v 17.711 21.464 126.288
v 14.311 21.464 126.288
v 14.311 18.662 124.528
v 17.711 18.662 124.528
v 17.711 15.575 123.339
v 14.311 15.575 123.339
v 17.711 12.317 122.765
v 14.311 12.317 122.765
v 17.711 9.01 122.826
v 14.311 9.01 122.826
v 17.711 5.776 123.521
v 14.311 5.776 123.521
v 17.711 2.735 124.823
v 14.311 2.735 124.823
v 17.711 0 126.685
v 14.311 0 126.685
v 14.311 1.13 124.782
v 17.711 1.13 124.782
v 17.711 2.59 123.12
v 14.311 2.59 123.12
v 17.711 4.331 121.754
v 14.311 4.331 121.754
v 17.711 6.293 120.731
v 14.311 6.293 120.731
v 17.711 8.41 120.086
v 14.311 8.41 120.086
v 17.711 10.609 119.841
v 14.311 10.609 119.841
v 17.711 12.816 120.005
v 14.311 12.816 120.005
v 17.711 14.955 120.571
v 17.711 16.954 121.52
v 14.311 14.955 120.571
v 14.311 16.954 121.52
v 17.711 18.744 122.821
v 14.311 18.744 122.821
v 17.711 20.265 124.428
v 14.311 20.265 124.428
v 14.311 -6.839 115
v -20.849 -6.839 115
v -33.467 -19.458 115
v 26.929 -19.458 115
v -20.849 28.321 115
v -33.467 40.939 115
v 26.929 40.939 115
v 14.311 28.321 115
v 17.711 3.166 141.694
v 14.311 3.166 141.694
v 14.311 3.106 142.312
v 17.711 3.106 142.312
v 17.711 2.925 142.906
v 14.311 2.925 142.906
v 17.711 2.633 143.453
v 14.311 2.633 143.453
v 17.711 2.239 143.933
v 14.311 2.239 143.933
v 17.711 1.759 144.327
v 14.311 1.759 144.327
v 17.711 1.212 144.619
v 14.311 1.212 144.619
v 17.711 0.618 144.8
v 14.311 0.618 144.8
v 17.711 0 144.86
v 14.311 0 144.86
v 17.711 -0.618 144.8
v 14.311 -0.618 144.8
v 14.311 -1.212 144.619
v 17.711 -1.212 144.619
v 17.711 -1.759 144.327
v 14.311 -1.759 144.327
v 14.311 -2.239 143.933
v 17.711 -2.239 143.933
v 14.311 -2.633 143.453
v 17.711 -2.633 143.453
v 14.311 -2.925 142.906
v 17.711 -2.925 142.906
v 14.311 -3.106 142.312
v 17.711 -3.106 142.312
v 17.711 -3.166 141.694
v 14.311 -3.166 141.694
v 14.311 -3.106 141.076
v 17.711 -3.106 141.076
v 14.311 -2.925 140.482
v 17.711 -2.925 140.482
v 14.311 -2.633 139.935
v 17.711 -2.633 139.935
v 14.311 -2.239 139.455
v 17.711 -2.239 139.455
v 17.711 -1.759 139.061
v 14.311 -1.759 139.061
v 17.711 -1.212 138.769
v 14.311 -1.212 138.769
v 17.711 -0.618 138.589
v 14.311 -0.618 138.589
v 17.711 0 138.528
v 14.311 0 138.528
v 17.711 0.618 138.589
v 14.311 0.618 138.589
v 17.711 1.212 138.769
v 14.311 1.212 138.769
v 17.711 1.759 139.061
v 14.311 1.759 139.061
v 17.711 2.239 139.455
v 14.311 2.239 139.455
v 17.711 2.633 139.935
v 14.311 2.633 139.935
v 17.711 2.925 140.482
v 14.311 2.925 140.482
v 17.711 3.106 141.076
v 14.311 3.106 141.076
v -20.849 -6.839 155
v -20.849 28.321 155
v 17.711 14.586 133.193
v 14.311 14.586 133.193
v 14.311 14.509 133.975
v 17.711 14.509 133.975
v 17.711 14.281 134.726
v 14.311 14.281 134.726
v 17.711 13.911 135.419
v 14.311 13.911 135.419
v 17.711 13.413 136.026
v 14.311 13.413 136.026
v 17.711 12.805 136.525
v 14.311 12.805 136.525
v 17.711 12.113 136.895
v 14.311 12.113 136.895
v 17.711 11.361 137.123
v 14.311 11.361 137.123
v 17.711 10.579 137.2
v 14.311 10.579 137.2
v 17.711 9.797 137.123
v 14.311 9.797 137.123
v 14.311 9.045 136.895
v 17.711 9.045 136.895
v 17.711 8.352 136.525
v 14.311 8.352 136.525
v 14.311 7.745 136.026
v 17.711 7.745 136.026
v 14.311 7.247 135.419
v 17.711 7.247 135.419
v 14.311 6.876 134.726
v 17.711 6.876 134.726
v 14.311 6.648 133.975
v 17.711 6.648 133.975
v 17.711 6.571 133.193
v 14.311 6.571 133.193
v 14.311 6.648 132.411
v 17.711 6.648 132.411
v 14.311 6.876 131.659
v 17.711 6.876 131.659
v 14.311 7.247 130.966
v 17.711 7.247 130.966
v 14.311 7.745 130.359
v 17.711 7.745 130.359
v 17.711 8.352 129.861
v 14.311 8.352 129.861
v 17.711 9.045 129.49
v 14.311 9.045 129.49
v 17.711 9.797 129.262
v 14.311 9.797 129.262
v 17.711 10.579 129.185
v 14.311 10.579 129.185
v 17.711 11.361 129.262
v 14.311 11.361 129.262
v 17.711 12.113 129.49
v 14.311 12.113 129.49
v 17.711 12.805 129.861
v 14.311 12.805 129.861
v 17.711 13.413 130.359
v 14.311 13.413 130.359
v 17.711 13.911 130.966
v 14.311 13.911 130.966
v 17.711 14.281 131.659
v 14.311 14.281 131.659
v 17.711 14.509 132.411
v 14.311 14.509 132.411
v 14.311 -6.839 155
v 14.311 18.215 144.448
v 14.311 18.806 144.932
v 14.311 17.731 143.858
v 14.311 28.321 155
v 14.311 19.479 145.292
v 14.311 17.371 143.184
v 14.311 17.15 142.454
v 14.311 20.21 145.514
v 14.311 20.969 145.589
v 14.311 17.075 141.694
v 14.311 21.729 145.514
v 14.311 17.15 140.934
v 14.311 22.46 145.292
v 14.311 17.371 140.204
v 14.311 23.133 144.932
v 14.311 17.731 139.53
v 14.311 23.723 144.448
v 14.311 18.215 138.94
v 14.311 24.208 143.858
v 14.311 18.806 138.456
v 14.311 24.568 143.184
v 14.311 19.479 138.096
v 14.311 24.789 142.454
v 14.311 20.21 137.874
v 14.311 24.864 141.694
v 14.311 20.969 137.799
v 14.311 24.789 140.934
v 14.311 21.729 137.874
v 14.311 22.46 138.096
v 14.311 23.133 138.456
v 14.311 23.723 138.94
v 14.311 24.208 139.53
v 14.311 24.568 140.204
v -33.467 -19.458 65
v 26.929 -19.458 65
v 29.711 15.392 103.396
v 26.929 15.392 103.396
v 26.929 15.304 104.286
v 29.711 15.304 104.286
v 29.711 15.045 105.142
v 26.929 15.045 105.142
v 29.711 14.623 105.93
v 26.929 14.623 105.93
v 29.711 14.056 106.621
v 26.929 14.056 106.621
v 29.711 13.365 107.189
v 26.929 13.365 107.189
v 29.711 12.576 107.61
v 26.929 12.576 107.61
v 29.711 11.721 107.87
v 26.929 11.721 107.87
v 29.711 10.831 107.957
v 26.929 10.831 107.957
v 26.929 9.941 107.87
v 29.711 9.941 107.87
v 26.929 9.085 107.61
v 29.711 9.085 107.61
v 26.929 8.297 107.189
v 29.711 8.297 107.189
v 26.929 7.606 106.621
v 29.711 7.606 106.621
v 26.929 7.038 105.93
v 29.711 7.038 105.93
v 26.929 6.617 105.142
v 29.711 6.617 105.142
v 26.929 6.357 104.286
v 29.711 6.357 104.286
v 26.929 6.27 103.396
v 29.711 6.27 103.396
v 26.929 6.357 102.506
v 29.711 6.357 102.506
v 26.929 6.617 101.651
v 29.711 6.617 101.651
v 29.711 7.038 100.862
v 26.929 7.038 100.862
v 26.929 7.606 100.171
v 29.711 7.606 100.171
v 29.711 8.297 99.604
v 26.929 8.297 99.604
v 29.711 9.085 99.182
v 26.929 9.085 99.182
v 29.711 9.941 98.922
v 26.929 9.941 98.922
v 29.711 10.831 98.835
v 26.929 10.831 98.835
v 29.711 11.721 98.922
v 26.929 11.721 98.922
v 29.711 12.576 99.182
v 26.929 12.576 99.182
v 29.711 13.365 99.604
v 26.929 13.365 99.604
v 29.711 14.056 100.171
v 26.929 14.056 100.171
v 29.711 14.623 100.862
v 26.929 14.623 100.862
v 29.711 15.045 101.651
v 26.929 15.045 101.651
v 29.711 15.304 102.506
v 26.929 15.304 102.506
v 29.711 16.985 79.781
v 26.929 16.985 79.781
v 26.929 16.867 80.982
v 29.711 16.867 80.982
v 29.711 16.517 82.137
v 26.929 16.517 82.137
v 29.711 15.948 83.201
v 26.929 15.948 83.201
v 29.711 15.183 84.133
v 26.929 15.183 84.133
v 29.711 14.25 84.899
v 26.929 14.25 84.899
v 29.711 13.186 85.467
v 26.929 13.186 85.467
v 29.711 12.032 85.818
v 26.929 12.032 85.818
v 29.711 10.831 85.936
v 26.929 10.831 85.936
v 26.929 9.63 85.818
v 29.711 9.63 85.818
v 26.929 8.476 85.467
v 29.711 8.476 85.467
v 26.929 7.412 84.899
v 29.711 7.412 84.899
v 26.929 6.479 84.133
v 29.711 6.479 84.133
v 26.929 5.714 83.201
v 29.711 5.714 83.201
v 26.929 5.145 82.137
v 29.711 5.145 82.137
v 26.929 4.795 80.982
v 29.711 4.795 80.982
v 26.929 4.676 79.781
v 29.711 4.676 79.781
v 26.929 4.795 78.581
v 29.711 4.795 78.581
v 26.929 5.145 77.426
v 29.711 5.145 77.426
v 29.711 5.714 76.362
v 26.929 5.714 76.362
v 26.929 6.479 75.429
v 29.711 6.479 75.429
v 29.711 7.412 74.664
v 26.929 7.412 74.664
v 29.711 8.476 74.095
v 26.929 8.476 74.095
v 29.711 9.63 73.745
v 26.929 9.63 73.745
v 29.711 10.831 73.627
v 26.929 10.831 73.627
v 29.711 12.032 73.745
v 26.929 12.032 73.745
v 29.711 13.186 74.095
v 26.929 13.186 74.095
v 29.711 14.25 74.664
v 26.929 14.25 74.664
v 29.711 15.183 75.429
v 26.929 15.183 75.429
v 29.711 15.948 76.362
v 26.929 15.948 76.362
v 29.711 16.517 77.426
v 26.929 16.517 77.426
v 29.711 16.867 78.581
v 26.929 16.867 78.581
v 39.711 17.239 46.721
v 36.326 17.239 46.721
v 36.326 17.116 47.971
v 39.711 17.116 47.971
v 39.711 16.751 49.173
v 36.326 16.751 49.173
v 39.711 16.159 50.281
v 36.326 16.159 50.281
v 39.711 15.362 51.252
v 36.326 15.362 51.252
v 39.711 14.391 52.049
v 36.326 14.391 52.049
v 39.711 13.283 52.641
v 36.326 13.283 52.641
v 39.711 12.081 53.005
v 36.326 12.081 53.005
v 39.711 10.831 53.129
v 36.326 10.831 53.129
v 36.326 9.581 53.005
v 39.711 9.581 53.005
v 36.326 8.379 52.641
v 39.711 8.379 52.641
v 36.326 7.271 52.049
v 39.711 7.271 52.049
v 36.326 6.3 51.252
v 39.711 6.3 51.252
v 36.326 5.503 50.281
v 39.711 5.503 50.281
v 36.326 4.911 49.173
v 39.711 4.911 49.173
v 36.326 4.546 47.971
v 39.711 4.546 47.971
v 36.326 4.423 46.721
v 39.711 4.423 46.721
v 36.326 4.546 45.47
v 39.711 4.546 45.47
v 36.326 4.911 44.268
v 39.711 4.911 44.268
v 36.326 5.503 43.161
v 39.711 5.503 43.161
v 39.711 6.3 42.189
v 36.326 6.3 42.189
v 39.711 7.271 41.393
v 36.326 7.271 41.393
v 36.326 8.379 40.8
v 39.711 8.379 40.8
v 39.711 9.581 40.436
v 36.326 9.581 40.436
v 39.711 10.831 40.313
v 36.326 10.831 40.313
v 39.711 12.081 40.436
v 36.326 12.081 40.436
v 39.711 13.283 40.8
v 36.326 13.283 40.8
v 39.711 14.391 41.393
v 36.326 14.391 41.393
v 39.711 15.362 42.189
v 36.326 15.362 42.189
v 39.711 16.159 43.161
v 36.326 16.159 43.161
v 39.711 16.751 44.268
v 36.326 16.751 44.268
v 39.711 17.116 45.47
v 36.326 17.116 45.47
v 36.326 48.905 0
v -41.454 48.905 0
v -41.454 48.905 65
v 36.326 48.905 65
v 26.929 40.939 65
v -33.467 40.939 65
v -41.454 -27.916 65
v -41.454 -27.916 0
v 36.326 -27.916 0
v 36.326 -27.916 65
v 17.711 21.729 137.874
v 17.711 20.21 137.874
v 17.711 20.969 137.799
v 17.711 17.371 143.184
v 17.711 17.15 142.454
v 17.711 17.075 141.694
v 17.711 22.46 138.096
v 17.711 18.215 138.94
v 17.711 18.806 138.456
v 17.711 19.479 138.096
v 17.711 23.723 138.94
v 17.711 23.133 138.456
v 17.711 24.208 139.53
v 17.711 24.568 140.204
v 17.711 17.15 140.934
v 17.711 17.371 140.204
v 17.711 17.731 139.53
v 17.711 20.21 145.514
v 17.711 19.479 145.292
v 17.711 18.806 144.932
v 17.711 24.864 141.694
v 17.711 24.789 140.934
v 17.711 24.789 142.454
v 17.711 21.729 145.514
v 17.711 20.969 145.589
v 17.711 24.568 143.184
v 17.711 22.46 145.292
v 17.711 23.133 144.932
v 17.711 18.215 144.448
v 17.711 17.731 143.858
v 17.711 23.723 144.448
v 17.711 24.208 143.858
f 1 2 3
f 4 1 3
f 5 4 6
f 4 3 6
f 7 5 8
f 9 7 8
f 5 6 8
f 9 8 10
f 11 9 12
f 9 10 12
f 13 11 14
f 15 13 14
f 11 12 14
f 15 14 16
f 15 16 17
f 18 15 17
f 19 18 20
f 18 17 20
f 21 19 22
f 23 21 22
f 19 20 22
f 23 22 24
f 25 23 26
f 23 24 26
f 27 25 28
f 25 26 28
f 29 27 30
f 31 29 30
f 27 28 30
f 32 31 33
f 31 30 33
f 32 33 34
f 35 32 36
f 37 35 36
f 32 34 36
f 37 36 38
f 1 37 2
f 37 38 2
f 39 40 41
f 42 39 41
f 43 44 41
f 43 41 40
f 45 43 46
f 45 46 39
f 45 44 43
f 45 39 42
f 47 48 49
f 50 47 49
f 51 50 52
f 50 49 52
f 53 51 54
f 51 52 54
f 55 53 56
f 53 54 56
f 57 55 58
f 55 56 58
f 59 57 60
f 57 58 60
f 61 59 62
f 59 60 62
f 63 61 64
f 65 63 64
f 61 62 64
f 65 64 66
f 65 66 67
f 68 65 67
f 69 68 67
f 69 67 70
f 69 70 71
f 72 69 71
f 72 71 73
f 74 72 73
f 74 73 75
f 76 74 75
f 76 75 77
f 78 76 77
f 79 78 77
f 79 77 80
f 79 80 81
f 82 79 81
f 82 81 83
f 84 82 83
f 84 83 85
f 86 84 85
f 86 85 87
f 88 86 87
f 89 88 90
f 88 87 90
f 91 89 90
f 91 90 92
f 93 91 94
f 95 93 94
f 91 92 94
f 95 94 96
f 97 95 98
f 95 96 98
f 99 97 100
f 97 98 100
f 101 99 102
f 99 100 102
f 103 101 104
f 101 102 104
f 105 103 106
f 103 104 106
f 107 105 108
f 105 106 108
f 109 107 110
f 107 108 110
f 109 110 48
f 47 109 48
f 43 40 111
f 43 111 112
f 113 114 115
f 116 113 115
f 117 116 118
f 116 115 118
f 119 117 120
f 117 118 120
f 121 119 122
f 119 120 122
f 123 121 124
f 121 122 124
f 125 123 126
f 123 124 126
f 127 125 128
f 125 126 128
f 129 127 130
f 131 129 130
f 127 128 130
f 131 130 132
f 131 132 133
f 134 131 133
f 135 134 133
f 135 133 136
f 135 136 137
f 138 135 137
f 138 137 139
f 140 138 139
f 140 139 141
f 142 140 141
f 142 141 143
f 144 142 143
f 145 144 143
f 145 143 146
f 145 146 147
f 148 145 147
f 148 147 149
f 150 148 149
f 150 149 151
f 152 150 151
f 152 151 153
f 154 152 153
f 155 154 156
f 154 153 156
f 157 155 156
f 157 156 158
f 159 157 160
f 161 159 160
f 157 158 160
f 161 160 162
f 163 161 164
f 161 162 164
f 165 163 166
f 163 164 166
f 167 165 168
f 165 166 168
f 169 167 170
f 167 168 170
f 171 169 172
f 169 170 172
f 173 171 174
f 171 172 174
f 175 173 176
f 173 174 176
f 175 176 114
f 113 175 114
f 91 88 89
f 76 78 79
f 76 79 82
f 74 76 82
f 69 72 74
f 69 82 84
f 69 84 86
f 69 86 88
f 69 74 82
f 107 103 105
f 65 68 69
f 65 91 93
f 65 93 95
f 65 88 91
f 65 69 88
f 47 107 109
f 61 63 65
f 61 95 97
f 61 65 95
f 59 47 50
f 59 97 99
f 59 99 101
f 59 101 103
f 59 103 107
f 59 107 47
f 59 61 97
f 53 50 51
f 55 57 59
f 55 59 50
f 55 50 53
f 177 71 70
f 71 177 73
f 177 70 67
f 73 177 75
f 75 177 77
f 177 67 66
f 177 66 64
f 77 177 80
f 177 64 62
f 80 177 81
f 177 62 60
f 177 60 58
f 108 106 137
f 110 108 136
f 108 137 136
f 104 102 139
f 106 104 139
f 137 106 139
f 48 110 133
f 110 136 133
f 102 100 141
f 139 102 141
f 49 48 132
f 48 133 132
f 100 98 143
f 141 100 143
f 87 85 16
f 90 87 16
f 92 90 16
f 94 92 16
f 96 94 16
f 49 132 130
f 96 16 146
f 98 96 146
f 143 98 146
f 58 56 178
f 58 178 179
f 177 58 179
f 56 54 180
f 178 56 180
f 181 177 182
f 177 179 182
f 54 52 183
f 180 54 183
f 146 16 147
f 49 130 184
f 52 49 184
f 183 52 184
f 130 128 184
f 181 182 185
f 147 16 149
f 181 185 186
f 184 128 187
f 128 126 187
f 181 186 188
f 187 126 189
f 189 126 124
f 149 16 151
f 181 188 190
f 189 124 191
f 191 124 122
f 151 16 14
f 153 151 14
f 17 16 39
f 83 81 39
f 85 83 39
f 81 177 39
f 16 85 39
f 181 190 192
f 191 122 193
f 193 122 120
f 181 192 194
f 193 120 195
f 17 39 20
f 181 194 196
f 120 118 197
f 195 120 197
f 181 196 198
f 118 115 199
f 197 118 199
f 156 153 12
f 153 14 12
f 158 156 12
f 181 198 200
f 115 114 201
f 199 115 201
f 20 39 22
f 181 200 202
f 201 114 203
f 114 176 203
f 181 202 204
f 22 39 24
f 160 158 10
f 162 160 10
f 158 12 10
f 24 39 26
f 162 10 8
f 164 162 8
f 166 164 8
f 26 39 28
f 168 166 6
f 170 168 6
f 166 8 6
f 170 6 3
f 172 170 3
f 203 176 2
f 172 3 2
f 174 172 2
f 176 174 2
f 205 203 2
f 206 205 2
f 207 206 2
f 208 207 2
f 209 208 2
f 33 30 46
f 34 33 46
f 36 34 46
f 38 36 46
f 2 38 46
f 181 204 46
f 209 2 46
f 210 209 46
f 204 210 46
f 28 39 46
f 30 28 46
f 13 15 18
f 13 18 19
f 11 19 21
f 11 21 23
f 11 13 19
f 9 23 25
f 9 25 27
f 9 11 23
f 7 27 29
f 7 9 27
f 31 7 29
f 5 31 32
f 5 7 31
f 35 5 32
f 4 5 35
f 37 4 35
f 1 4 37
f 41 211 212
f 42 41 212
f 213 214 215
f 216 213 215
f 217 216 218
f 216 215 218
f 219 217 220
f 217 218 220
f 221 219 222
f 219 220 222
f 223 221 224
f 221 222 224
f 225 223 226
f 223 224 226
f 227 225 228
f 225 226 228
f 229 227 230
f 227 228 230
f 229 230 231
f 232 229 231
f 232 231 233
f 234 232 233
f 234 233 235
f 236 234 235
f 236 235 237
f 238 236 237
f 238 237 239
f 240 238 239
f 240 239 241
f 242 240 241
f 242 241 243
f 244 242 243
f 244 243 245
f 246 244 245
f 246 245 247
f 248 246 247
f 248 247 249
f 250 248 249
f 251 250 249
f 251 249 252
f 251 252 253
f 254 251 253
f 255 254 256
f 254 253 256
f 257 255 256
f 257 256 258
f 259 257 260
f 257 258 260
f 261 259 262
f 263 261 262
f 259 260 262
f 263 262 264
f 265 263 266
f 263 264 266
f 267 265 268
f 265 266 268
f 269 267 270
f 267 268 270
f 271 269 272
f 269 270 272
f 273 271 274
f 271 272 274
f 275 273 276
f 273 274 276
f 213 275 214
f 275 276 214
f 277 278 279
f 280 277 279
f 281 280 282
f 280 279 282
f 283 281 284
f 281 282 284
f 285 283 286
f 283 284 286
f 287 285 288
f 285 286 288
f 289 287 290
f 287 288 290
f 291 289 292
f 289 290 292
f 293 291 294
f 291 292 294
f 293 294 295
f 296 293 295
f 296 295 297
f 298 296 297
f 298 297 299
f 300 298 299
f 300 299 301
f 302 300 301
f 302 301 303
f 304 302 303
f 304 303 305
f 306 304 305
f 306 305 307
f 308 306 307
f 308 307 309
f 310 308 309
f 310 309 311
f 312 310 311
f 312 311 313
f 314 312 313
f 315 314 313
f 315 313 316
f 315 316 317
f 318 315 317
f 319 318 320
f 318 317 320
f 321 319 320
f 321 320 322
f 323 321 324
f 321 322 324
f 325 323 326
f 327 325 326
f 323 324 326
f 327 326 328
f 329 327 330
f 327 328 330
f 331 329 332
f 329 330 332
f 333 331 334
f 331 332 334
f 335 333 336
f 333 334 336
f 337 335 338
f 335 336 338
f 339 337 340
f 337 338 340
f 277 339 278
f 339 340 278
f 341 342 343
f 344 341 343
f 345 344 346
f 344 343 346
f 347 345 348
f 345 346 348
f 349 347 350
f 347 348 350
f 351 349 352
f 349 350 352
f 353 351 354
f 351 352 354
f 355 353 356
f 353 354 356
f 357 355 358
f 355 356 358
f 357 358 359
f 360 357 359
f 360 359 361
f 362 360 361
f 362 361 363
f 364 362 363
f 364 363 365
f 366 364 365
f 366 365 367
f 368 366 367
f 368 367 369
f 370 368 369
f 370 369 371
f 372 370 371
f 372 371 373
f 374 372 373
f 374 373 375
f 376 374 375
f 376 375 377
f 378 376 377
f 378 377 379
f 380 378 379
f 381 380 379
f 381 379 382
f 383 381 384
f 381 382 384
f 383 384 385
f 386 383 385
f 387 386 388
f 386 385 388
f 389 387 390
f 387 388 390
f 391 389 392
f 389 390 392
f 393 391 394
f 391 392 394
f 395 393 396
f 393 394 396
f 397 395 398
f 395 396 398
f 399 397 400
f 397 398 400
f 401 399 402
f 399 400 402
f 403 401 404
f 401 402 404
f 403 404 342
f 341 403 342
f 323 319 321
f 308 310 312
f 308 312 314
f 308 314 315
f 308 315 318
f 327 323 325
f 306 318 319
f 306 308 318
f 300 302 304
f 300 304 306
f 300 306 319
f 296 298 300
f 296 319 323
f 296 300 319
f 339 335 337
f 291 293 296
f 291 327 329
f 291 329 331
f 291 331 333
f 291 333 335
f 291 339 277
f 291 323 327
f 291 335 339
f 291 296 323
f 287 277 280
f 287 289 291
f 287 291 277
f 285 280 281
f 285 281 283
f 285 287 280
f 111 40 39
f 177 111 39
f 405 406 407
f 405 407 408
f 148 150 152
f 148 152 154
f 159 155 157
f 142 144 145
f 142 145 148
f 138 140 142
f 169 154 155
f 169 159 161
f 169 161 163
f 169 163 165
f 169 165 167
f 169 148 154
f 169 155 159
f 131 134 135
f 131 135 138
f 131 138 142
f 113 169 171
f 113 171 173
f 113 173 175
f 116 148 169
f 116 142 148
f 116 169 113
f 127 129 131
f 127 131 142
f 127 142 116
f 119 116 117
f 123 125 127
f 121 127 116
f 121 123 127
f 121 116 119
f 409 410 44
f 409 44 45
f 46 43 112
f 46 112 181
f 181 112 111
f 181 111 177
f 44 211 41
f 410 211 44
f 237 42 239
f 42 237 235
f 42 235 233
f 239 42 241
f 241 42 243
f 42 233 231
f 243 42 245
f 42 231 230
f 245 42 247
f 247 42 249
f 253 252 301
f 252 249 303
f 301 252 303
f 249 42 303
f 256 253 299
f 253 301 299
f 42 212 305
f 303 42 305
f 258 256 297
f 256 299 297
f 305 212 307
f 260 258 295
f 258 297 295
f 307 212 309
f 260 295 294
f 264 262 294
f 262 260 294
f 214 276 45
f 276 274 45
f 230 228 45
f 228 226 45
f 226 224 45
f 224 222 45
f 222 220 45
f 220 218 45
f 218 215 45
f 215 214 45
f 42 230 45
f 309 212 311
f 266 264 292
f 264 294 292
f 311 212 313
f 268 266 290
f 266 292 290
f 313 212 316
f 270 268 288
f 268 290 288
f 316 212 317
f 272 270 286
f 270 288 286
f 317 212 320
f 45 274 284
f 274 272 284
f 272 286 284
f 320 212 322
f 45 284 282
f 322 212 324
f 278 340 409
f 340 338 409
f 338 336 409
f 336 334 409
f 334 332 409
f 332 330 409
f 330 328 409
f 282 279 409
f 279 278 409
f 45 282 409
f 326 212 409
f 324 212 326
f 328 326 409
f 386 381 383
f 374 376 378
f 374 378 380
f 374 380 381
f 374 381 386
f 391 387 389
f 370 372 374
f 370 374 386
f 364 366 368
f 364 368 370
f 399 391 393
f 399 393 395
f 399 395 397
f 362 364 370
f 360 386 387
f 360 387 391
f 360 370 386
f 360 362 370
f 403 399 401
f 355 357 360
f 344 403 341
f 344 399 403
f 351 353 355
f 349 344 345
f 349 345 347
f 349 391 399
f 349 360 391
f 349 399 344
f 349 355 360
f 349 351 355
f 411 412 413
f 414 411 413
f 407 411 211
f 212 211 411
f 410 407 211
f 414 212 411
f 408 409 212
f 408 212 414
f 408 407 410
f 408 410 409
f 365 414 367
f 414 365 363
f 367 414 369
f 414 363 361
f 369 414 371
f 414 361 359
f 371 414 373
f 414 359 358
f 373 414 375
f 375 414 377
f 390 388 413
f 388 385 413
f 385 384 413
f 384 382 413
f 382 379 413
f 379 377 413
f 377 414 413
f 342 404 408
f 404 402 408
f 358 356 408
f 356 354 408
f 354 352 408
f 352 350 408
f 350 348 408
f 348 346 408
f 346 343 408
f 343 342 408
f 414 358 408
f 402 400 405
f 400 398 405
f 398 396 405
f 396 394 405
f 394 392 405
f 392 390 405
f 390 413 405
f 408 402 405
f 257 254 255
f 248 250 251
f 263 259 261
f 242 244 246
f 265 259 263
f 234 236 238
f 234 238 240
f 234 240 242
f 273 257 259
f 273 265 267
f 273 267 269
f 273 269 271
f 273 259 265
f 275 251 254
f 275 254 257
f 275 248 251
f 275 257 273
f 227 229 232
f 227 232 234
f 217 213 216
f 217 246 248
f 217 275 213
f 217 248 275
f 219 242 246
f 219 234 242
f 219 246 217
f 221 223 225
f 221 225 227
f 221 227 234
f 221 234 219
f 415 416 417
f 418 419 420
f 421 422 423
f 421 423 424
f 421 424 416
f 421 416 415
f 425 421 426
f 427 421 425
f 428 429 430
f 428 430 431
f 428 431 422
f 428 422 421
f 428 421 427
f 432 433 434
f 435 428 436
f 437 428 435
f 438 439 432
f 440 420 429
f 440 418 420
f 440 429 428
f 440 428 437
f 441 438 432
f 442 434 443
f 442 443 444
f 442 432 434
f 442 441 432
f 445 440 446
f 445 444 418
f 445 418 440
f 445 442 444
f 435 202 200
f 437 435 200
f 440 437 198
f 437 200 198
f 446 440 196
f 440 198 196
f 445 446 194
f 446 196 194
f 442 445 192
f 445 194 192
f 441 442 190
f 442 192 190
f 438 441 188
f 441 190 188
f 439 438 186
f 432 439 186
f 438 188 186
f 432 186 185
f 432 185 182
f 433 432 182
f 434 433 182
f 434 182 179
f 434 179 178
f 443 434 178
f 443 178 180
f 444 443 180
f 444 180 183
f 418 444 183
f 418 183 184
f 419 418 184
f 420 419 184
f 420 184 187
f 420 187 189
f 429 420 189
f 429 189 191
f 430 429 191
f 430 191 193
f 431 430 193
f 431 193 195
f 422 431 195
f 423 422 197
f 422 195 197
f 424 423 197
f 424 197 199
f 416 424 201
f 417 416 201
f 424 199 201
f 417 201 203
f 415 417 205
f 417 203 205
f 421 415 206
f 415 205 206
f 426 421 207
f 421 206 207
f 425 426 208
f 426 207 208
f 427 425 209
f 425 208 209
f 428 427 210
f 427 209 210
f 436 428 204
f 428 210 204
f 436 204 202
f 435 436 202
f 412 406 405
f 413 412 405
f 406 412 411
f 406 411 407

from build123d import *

# Parameters (mm, degrees)
F0_W      = 77.780351
F0_H      = 76.820102
F1_DEPTH  = 65
F2_W      = 60.396654
F2_H      = 60.396655
F3_DEPTH  = 50
F4_W      = 35.160178
F4_H      = 35.160179
F5_DEPTH  = 40
F6_R      = 3.166361
F6_R_2    = 3.894654
F6_R_3    = 4.007563
F6_R_4    = 4.561233
F6_R_5    = 6.154541
F6_R_6    = 6.407927
F7_DEPTH  = 25.4
F8_R      = 4.561233
F8_R_2    = 6.154541
F8_R_3    = 4.007563
F8_R_4    = 3.894654
F8_R_5    = 3.166361
F9_DEPTH  = 10
F10_R     = 3.166361
F10_R_2   = 4.007563
F10_R_3   = 3.894654
F11_DEPTH = 12


with BuildPart() as f1:
    # F0 (on Top) → F1 (new body)
    with BuildSketch(Plane.XY):
        with Locations((-2.563856, 10.494465)):
            Rectangle(F0_W, F0_H)
    extrude(amount=F1_DEPTH)

    # F2 (on face) → F3 (join)
    with BuildSketch(Plane.XY.offset(65)):
        with Locations((-3.268891, 10.740642)):
            Rectangle(F2_W, F2_H)
    extrude(amount=F3_DEPTH)

    # F4 (on face) → F5 (join)
    with BuildSketch(Plane.XY.offset(115)):
        with Locations((-3.268891, 10.740642)):
            Rectangle(F4_W, F4_H)
    extrude(amount=F5_DEPTH)

    # F6 (on face) → F7 (join)
    with BuildSketch(Plane.YZ.offset(14.311198)):
        with Locations((0, 141.694024)):
            Circle(F6_R)
        with Locations((20.969419, 141.694024)):
            Circle(F6_R_2)
        with Locations((10.578918, 133.192703)):
            Circle(F6_R_3)
        with BuildLine():
            ThreePointArc((21.463975, 126.287654), (10.662218, 122.715489), (0, 126.6848))
            ThreePointArc((0, 126.6848), (10.609036, 119.841253), (21.463975, 126.287654))
        make_face()
        with Locations((10.830865, 103.396073)):
            Circle(F6_R_4)
        with Locations((10.830865, 79.781286)):
            Circle(F6_R_5)
        with Locations((10.830865, 46.720583)):
            Circle(F6_R_6)
    extrude(amount=F7_DEPTH)

    # F8 (on face) → F9 (cut)
    with BuildSketch(Plane.YZ.offset(39.711198)):
        with Locations((10.830865, 103.396073)):
            Circle(F8_R)
        with BuildLine():
            ThreePointArc((0, 126.6848), (10.609036, 119.841253), (21.463975, 126.287654))
            ThreePointArc((21.463975, 126.287654), (10.662218, 122.715489), (0, 126.6848))
        make_face()
        with Locations((10.830865, 79.781286)):
            Circle(F8_R_2)
        with Locations((10.578918, 133.192703)):
            Circle(F8_R_3)
        with Locations((20.969419, 141.694024)):
            Circle(F8_R_4)
        with Locations((0, 141.694024)):
            Circle(F8_R_5)
    extrude(amount=-F9_DEPTH, mode=Mode.SUBTRACT)

    # F10 (on face) → F11 (cut)
    with BuildSketch(Plane.YZ.offset(29.711198)):
        with Locations((0, 141.694024)):
            Circle(F10_R)
        with Locations((10.578918, 133.192703)):
            Circle(F10_R_2)
        with Locations((20.969419, 141.694024)):
            Circle(F10_R_3)
        with BuildLine():
            ThreePointArc((0, 126.6848), (10.609036, 119.841253), (21.463975, 126.287654))
            ThreePointArc((21.463975, 126.287654), (10.662218, 122.715489), (0, 126.6848))
        make_face()
    extrude(amount=-F11_DEPTH, mode=Mode.SUBTRACT)


solid = f1.part
